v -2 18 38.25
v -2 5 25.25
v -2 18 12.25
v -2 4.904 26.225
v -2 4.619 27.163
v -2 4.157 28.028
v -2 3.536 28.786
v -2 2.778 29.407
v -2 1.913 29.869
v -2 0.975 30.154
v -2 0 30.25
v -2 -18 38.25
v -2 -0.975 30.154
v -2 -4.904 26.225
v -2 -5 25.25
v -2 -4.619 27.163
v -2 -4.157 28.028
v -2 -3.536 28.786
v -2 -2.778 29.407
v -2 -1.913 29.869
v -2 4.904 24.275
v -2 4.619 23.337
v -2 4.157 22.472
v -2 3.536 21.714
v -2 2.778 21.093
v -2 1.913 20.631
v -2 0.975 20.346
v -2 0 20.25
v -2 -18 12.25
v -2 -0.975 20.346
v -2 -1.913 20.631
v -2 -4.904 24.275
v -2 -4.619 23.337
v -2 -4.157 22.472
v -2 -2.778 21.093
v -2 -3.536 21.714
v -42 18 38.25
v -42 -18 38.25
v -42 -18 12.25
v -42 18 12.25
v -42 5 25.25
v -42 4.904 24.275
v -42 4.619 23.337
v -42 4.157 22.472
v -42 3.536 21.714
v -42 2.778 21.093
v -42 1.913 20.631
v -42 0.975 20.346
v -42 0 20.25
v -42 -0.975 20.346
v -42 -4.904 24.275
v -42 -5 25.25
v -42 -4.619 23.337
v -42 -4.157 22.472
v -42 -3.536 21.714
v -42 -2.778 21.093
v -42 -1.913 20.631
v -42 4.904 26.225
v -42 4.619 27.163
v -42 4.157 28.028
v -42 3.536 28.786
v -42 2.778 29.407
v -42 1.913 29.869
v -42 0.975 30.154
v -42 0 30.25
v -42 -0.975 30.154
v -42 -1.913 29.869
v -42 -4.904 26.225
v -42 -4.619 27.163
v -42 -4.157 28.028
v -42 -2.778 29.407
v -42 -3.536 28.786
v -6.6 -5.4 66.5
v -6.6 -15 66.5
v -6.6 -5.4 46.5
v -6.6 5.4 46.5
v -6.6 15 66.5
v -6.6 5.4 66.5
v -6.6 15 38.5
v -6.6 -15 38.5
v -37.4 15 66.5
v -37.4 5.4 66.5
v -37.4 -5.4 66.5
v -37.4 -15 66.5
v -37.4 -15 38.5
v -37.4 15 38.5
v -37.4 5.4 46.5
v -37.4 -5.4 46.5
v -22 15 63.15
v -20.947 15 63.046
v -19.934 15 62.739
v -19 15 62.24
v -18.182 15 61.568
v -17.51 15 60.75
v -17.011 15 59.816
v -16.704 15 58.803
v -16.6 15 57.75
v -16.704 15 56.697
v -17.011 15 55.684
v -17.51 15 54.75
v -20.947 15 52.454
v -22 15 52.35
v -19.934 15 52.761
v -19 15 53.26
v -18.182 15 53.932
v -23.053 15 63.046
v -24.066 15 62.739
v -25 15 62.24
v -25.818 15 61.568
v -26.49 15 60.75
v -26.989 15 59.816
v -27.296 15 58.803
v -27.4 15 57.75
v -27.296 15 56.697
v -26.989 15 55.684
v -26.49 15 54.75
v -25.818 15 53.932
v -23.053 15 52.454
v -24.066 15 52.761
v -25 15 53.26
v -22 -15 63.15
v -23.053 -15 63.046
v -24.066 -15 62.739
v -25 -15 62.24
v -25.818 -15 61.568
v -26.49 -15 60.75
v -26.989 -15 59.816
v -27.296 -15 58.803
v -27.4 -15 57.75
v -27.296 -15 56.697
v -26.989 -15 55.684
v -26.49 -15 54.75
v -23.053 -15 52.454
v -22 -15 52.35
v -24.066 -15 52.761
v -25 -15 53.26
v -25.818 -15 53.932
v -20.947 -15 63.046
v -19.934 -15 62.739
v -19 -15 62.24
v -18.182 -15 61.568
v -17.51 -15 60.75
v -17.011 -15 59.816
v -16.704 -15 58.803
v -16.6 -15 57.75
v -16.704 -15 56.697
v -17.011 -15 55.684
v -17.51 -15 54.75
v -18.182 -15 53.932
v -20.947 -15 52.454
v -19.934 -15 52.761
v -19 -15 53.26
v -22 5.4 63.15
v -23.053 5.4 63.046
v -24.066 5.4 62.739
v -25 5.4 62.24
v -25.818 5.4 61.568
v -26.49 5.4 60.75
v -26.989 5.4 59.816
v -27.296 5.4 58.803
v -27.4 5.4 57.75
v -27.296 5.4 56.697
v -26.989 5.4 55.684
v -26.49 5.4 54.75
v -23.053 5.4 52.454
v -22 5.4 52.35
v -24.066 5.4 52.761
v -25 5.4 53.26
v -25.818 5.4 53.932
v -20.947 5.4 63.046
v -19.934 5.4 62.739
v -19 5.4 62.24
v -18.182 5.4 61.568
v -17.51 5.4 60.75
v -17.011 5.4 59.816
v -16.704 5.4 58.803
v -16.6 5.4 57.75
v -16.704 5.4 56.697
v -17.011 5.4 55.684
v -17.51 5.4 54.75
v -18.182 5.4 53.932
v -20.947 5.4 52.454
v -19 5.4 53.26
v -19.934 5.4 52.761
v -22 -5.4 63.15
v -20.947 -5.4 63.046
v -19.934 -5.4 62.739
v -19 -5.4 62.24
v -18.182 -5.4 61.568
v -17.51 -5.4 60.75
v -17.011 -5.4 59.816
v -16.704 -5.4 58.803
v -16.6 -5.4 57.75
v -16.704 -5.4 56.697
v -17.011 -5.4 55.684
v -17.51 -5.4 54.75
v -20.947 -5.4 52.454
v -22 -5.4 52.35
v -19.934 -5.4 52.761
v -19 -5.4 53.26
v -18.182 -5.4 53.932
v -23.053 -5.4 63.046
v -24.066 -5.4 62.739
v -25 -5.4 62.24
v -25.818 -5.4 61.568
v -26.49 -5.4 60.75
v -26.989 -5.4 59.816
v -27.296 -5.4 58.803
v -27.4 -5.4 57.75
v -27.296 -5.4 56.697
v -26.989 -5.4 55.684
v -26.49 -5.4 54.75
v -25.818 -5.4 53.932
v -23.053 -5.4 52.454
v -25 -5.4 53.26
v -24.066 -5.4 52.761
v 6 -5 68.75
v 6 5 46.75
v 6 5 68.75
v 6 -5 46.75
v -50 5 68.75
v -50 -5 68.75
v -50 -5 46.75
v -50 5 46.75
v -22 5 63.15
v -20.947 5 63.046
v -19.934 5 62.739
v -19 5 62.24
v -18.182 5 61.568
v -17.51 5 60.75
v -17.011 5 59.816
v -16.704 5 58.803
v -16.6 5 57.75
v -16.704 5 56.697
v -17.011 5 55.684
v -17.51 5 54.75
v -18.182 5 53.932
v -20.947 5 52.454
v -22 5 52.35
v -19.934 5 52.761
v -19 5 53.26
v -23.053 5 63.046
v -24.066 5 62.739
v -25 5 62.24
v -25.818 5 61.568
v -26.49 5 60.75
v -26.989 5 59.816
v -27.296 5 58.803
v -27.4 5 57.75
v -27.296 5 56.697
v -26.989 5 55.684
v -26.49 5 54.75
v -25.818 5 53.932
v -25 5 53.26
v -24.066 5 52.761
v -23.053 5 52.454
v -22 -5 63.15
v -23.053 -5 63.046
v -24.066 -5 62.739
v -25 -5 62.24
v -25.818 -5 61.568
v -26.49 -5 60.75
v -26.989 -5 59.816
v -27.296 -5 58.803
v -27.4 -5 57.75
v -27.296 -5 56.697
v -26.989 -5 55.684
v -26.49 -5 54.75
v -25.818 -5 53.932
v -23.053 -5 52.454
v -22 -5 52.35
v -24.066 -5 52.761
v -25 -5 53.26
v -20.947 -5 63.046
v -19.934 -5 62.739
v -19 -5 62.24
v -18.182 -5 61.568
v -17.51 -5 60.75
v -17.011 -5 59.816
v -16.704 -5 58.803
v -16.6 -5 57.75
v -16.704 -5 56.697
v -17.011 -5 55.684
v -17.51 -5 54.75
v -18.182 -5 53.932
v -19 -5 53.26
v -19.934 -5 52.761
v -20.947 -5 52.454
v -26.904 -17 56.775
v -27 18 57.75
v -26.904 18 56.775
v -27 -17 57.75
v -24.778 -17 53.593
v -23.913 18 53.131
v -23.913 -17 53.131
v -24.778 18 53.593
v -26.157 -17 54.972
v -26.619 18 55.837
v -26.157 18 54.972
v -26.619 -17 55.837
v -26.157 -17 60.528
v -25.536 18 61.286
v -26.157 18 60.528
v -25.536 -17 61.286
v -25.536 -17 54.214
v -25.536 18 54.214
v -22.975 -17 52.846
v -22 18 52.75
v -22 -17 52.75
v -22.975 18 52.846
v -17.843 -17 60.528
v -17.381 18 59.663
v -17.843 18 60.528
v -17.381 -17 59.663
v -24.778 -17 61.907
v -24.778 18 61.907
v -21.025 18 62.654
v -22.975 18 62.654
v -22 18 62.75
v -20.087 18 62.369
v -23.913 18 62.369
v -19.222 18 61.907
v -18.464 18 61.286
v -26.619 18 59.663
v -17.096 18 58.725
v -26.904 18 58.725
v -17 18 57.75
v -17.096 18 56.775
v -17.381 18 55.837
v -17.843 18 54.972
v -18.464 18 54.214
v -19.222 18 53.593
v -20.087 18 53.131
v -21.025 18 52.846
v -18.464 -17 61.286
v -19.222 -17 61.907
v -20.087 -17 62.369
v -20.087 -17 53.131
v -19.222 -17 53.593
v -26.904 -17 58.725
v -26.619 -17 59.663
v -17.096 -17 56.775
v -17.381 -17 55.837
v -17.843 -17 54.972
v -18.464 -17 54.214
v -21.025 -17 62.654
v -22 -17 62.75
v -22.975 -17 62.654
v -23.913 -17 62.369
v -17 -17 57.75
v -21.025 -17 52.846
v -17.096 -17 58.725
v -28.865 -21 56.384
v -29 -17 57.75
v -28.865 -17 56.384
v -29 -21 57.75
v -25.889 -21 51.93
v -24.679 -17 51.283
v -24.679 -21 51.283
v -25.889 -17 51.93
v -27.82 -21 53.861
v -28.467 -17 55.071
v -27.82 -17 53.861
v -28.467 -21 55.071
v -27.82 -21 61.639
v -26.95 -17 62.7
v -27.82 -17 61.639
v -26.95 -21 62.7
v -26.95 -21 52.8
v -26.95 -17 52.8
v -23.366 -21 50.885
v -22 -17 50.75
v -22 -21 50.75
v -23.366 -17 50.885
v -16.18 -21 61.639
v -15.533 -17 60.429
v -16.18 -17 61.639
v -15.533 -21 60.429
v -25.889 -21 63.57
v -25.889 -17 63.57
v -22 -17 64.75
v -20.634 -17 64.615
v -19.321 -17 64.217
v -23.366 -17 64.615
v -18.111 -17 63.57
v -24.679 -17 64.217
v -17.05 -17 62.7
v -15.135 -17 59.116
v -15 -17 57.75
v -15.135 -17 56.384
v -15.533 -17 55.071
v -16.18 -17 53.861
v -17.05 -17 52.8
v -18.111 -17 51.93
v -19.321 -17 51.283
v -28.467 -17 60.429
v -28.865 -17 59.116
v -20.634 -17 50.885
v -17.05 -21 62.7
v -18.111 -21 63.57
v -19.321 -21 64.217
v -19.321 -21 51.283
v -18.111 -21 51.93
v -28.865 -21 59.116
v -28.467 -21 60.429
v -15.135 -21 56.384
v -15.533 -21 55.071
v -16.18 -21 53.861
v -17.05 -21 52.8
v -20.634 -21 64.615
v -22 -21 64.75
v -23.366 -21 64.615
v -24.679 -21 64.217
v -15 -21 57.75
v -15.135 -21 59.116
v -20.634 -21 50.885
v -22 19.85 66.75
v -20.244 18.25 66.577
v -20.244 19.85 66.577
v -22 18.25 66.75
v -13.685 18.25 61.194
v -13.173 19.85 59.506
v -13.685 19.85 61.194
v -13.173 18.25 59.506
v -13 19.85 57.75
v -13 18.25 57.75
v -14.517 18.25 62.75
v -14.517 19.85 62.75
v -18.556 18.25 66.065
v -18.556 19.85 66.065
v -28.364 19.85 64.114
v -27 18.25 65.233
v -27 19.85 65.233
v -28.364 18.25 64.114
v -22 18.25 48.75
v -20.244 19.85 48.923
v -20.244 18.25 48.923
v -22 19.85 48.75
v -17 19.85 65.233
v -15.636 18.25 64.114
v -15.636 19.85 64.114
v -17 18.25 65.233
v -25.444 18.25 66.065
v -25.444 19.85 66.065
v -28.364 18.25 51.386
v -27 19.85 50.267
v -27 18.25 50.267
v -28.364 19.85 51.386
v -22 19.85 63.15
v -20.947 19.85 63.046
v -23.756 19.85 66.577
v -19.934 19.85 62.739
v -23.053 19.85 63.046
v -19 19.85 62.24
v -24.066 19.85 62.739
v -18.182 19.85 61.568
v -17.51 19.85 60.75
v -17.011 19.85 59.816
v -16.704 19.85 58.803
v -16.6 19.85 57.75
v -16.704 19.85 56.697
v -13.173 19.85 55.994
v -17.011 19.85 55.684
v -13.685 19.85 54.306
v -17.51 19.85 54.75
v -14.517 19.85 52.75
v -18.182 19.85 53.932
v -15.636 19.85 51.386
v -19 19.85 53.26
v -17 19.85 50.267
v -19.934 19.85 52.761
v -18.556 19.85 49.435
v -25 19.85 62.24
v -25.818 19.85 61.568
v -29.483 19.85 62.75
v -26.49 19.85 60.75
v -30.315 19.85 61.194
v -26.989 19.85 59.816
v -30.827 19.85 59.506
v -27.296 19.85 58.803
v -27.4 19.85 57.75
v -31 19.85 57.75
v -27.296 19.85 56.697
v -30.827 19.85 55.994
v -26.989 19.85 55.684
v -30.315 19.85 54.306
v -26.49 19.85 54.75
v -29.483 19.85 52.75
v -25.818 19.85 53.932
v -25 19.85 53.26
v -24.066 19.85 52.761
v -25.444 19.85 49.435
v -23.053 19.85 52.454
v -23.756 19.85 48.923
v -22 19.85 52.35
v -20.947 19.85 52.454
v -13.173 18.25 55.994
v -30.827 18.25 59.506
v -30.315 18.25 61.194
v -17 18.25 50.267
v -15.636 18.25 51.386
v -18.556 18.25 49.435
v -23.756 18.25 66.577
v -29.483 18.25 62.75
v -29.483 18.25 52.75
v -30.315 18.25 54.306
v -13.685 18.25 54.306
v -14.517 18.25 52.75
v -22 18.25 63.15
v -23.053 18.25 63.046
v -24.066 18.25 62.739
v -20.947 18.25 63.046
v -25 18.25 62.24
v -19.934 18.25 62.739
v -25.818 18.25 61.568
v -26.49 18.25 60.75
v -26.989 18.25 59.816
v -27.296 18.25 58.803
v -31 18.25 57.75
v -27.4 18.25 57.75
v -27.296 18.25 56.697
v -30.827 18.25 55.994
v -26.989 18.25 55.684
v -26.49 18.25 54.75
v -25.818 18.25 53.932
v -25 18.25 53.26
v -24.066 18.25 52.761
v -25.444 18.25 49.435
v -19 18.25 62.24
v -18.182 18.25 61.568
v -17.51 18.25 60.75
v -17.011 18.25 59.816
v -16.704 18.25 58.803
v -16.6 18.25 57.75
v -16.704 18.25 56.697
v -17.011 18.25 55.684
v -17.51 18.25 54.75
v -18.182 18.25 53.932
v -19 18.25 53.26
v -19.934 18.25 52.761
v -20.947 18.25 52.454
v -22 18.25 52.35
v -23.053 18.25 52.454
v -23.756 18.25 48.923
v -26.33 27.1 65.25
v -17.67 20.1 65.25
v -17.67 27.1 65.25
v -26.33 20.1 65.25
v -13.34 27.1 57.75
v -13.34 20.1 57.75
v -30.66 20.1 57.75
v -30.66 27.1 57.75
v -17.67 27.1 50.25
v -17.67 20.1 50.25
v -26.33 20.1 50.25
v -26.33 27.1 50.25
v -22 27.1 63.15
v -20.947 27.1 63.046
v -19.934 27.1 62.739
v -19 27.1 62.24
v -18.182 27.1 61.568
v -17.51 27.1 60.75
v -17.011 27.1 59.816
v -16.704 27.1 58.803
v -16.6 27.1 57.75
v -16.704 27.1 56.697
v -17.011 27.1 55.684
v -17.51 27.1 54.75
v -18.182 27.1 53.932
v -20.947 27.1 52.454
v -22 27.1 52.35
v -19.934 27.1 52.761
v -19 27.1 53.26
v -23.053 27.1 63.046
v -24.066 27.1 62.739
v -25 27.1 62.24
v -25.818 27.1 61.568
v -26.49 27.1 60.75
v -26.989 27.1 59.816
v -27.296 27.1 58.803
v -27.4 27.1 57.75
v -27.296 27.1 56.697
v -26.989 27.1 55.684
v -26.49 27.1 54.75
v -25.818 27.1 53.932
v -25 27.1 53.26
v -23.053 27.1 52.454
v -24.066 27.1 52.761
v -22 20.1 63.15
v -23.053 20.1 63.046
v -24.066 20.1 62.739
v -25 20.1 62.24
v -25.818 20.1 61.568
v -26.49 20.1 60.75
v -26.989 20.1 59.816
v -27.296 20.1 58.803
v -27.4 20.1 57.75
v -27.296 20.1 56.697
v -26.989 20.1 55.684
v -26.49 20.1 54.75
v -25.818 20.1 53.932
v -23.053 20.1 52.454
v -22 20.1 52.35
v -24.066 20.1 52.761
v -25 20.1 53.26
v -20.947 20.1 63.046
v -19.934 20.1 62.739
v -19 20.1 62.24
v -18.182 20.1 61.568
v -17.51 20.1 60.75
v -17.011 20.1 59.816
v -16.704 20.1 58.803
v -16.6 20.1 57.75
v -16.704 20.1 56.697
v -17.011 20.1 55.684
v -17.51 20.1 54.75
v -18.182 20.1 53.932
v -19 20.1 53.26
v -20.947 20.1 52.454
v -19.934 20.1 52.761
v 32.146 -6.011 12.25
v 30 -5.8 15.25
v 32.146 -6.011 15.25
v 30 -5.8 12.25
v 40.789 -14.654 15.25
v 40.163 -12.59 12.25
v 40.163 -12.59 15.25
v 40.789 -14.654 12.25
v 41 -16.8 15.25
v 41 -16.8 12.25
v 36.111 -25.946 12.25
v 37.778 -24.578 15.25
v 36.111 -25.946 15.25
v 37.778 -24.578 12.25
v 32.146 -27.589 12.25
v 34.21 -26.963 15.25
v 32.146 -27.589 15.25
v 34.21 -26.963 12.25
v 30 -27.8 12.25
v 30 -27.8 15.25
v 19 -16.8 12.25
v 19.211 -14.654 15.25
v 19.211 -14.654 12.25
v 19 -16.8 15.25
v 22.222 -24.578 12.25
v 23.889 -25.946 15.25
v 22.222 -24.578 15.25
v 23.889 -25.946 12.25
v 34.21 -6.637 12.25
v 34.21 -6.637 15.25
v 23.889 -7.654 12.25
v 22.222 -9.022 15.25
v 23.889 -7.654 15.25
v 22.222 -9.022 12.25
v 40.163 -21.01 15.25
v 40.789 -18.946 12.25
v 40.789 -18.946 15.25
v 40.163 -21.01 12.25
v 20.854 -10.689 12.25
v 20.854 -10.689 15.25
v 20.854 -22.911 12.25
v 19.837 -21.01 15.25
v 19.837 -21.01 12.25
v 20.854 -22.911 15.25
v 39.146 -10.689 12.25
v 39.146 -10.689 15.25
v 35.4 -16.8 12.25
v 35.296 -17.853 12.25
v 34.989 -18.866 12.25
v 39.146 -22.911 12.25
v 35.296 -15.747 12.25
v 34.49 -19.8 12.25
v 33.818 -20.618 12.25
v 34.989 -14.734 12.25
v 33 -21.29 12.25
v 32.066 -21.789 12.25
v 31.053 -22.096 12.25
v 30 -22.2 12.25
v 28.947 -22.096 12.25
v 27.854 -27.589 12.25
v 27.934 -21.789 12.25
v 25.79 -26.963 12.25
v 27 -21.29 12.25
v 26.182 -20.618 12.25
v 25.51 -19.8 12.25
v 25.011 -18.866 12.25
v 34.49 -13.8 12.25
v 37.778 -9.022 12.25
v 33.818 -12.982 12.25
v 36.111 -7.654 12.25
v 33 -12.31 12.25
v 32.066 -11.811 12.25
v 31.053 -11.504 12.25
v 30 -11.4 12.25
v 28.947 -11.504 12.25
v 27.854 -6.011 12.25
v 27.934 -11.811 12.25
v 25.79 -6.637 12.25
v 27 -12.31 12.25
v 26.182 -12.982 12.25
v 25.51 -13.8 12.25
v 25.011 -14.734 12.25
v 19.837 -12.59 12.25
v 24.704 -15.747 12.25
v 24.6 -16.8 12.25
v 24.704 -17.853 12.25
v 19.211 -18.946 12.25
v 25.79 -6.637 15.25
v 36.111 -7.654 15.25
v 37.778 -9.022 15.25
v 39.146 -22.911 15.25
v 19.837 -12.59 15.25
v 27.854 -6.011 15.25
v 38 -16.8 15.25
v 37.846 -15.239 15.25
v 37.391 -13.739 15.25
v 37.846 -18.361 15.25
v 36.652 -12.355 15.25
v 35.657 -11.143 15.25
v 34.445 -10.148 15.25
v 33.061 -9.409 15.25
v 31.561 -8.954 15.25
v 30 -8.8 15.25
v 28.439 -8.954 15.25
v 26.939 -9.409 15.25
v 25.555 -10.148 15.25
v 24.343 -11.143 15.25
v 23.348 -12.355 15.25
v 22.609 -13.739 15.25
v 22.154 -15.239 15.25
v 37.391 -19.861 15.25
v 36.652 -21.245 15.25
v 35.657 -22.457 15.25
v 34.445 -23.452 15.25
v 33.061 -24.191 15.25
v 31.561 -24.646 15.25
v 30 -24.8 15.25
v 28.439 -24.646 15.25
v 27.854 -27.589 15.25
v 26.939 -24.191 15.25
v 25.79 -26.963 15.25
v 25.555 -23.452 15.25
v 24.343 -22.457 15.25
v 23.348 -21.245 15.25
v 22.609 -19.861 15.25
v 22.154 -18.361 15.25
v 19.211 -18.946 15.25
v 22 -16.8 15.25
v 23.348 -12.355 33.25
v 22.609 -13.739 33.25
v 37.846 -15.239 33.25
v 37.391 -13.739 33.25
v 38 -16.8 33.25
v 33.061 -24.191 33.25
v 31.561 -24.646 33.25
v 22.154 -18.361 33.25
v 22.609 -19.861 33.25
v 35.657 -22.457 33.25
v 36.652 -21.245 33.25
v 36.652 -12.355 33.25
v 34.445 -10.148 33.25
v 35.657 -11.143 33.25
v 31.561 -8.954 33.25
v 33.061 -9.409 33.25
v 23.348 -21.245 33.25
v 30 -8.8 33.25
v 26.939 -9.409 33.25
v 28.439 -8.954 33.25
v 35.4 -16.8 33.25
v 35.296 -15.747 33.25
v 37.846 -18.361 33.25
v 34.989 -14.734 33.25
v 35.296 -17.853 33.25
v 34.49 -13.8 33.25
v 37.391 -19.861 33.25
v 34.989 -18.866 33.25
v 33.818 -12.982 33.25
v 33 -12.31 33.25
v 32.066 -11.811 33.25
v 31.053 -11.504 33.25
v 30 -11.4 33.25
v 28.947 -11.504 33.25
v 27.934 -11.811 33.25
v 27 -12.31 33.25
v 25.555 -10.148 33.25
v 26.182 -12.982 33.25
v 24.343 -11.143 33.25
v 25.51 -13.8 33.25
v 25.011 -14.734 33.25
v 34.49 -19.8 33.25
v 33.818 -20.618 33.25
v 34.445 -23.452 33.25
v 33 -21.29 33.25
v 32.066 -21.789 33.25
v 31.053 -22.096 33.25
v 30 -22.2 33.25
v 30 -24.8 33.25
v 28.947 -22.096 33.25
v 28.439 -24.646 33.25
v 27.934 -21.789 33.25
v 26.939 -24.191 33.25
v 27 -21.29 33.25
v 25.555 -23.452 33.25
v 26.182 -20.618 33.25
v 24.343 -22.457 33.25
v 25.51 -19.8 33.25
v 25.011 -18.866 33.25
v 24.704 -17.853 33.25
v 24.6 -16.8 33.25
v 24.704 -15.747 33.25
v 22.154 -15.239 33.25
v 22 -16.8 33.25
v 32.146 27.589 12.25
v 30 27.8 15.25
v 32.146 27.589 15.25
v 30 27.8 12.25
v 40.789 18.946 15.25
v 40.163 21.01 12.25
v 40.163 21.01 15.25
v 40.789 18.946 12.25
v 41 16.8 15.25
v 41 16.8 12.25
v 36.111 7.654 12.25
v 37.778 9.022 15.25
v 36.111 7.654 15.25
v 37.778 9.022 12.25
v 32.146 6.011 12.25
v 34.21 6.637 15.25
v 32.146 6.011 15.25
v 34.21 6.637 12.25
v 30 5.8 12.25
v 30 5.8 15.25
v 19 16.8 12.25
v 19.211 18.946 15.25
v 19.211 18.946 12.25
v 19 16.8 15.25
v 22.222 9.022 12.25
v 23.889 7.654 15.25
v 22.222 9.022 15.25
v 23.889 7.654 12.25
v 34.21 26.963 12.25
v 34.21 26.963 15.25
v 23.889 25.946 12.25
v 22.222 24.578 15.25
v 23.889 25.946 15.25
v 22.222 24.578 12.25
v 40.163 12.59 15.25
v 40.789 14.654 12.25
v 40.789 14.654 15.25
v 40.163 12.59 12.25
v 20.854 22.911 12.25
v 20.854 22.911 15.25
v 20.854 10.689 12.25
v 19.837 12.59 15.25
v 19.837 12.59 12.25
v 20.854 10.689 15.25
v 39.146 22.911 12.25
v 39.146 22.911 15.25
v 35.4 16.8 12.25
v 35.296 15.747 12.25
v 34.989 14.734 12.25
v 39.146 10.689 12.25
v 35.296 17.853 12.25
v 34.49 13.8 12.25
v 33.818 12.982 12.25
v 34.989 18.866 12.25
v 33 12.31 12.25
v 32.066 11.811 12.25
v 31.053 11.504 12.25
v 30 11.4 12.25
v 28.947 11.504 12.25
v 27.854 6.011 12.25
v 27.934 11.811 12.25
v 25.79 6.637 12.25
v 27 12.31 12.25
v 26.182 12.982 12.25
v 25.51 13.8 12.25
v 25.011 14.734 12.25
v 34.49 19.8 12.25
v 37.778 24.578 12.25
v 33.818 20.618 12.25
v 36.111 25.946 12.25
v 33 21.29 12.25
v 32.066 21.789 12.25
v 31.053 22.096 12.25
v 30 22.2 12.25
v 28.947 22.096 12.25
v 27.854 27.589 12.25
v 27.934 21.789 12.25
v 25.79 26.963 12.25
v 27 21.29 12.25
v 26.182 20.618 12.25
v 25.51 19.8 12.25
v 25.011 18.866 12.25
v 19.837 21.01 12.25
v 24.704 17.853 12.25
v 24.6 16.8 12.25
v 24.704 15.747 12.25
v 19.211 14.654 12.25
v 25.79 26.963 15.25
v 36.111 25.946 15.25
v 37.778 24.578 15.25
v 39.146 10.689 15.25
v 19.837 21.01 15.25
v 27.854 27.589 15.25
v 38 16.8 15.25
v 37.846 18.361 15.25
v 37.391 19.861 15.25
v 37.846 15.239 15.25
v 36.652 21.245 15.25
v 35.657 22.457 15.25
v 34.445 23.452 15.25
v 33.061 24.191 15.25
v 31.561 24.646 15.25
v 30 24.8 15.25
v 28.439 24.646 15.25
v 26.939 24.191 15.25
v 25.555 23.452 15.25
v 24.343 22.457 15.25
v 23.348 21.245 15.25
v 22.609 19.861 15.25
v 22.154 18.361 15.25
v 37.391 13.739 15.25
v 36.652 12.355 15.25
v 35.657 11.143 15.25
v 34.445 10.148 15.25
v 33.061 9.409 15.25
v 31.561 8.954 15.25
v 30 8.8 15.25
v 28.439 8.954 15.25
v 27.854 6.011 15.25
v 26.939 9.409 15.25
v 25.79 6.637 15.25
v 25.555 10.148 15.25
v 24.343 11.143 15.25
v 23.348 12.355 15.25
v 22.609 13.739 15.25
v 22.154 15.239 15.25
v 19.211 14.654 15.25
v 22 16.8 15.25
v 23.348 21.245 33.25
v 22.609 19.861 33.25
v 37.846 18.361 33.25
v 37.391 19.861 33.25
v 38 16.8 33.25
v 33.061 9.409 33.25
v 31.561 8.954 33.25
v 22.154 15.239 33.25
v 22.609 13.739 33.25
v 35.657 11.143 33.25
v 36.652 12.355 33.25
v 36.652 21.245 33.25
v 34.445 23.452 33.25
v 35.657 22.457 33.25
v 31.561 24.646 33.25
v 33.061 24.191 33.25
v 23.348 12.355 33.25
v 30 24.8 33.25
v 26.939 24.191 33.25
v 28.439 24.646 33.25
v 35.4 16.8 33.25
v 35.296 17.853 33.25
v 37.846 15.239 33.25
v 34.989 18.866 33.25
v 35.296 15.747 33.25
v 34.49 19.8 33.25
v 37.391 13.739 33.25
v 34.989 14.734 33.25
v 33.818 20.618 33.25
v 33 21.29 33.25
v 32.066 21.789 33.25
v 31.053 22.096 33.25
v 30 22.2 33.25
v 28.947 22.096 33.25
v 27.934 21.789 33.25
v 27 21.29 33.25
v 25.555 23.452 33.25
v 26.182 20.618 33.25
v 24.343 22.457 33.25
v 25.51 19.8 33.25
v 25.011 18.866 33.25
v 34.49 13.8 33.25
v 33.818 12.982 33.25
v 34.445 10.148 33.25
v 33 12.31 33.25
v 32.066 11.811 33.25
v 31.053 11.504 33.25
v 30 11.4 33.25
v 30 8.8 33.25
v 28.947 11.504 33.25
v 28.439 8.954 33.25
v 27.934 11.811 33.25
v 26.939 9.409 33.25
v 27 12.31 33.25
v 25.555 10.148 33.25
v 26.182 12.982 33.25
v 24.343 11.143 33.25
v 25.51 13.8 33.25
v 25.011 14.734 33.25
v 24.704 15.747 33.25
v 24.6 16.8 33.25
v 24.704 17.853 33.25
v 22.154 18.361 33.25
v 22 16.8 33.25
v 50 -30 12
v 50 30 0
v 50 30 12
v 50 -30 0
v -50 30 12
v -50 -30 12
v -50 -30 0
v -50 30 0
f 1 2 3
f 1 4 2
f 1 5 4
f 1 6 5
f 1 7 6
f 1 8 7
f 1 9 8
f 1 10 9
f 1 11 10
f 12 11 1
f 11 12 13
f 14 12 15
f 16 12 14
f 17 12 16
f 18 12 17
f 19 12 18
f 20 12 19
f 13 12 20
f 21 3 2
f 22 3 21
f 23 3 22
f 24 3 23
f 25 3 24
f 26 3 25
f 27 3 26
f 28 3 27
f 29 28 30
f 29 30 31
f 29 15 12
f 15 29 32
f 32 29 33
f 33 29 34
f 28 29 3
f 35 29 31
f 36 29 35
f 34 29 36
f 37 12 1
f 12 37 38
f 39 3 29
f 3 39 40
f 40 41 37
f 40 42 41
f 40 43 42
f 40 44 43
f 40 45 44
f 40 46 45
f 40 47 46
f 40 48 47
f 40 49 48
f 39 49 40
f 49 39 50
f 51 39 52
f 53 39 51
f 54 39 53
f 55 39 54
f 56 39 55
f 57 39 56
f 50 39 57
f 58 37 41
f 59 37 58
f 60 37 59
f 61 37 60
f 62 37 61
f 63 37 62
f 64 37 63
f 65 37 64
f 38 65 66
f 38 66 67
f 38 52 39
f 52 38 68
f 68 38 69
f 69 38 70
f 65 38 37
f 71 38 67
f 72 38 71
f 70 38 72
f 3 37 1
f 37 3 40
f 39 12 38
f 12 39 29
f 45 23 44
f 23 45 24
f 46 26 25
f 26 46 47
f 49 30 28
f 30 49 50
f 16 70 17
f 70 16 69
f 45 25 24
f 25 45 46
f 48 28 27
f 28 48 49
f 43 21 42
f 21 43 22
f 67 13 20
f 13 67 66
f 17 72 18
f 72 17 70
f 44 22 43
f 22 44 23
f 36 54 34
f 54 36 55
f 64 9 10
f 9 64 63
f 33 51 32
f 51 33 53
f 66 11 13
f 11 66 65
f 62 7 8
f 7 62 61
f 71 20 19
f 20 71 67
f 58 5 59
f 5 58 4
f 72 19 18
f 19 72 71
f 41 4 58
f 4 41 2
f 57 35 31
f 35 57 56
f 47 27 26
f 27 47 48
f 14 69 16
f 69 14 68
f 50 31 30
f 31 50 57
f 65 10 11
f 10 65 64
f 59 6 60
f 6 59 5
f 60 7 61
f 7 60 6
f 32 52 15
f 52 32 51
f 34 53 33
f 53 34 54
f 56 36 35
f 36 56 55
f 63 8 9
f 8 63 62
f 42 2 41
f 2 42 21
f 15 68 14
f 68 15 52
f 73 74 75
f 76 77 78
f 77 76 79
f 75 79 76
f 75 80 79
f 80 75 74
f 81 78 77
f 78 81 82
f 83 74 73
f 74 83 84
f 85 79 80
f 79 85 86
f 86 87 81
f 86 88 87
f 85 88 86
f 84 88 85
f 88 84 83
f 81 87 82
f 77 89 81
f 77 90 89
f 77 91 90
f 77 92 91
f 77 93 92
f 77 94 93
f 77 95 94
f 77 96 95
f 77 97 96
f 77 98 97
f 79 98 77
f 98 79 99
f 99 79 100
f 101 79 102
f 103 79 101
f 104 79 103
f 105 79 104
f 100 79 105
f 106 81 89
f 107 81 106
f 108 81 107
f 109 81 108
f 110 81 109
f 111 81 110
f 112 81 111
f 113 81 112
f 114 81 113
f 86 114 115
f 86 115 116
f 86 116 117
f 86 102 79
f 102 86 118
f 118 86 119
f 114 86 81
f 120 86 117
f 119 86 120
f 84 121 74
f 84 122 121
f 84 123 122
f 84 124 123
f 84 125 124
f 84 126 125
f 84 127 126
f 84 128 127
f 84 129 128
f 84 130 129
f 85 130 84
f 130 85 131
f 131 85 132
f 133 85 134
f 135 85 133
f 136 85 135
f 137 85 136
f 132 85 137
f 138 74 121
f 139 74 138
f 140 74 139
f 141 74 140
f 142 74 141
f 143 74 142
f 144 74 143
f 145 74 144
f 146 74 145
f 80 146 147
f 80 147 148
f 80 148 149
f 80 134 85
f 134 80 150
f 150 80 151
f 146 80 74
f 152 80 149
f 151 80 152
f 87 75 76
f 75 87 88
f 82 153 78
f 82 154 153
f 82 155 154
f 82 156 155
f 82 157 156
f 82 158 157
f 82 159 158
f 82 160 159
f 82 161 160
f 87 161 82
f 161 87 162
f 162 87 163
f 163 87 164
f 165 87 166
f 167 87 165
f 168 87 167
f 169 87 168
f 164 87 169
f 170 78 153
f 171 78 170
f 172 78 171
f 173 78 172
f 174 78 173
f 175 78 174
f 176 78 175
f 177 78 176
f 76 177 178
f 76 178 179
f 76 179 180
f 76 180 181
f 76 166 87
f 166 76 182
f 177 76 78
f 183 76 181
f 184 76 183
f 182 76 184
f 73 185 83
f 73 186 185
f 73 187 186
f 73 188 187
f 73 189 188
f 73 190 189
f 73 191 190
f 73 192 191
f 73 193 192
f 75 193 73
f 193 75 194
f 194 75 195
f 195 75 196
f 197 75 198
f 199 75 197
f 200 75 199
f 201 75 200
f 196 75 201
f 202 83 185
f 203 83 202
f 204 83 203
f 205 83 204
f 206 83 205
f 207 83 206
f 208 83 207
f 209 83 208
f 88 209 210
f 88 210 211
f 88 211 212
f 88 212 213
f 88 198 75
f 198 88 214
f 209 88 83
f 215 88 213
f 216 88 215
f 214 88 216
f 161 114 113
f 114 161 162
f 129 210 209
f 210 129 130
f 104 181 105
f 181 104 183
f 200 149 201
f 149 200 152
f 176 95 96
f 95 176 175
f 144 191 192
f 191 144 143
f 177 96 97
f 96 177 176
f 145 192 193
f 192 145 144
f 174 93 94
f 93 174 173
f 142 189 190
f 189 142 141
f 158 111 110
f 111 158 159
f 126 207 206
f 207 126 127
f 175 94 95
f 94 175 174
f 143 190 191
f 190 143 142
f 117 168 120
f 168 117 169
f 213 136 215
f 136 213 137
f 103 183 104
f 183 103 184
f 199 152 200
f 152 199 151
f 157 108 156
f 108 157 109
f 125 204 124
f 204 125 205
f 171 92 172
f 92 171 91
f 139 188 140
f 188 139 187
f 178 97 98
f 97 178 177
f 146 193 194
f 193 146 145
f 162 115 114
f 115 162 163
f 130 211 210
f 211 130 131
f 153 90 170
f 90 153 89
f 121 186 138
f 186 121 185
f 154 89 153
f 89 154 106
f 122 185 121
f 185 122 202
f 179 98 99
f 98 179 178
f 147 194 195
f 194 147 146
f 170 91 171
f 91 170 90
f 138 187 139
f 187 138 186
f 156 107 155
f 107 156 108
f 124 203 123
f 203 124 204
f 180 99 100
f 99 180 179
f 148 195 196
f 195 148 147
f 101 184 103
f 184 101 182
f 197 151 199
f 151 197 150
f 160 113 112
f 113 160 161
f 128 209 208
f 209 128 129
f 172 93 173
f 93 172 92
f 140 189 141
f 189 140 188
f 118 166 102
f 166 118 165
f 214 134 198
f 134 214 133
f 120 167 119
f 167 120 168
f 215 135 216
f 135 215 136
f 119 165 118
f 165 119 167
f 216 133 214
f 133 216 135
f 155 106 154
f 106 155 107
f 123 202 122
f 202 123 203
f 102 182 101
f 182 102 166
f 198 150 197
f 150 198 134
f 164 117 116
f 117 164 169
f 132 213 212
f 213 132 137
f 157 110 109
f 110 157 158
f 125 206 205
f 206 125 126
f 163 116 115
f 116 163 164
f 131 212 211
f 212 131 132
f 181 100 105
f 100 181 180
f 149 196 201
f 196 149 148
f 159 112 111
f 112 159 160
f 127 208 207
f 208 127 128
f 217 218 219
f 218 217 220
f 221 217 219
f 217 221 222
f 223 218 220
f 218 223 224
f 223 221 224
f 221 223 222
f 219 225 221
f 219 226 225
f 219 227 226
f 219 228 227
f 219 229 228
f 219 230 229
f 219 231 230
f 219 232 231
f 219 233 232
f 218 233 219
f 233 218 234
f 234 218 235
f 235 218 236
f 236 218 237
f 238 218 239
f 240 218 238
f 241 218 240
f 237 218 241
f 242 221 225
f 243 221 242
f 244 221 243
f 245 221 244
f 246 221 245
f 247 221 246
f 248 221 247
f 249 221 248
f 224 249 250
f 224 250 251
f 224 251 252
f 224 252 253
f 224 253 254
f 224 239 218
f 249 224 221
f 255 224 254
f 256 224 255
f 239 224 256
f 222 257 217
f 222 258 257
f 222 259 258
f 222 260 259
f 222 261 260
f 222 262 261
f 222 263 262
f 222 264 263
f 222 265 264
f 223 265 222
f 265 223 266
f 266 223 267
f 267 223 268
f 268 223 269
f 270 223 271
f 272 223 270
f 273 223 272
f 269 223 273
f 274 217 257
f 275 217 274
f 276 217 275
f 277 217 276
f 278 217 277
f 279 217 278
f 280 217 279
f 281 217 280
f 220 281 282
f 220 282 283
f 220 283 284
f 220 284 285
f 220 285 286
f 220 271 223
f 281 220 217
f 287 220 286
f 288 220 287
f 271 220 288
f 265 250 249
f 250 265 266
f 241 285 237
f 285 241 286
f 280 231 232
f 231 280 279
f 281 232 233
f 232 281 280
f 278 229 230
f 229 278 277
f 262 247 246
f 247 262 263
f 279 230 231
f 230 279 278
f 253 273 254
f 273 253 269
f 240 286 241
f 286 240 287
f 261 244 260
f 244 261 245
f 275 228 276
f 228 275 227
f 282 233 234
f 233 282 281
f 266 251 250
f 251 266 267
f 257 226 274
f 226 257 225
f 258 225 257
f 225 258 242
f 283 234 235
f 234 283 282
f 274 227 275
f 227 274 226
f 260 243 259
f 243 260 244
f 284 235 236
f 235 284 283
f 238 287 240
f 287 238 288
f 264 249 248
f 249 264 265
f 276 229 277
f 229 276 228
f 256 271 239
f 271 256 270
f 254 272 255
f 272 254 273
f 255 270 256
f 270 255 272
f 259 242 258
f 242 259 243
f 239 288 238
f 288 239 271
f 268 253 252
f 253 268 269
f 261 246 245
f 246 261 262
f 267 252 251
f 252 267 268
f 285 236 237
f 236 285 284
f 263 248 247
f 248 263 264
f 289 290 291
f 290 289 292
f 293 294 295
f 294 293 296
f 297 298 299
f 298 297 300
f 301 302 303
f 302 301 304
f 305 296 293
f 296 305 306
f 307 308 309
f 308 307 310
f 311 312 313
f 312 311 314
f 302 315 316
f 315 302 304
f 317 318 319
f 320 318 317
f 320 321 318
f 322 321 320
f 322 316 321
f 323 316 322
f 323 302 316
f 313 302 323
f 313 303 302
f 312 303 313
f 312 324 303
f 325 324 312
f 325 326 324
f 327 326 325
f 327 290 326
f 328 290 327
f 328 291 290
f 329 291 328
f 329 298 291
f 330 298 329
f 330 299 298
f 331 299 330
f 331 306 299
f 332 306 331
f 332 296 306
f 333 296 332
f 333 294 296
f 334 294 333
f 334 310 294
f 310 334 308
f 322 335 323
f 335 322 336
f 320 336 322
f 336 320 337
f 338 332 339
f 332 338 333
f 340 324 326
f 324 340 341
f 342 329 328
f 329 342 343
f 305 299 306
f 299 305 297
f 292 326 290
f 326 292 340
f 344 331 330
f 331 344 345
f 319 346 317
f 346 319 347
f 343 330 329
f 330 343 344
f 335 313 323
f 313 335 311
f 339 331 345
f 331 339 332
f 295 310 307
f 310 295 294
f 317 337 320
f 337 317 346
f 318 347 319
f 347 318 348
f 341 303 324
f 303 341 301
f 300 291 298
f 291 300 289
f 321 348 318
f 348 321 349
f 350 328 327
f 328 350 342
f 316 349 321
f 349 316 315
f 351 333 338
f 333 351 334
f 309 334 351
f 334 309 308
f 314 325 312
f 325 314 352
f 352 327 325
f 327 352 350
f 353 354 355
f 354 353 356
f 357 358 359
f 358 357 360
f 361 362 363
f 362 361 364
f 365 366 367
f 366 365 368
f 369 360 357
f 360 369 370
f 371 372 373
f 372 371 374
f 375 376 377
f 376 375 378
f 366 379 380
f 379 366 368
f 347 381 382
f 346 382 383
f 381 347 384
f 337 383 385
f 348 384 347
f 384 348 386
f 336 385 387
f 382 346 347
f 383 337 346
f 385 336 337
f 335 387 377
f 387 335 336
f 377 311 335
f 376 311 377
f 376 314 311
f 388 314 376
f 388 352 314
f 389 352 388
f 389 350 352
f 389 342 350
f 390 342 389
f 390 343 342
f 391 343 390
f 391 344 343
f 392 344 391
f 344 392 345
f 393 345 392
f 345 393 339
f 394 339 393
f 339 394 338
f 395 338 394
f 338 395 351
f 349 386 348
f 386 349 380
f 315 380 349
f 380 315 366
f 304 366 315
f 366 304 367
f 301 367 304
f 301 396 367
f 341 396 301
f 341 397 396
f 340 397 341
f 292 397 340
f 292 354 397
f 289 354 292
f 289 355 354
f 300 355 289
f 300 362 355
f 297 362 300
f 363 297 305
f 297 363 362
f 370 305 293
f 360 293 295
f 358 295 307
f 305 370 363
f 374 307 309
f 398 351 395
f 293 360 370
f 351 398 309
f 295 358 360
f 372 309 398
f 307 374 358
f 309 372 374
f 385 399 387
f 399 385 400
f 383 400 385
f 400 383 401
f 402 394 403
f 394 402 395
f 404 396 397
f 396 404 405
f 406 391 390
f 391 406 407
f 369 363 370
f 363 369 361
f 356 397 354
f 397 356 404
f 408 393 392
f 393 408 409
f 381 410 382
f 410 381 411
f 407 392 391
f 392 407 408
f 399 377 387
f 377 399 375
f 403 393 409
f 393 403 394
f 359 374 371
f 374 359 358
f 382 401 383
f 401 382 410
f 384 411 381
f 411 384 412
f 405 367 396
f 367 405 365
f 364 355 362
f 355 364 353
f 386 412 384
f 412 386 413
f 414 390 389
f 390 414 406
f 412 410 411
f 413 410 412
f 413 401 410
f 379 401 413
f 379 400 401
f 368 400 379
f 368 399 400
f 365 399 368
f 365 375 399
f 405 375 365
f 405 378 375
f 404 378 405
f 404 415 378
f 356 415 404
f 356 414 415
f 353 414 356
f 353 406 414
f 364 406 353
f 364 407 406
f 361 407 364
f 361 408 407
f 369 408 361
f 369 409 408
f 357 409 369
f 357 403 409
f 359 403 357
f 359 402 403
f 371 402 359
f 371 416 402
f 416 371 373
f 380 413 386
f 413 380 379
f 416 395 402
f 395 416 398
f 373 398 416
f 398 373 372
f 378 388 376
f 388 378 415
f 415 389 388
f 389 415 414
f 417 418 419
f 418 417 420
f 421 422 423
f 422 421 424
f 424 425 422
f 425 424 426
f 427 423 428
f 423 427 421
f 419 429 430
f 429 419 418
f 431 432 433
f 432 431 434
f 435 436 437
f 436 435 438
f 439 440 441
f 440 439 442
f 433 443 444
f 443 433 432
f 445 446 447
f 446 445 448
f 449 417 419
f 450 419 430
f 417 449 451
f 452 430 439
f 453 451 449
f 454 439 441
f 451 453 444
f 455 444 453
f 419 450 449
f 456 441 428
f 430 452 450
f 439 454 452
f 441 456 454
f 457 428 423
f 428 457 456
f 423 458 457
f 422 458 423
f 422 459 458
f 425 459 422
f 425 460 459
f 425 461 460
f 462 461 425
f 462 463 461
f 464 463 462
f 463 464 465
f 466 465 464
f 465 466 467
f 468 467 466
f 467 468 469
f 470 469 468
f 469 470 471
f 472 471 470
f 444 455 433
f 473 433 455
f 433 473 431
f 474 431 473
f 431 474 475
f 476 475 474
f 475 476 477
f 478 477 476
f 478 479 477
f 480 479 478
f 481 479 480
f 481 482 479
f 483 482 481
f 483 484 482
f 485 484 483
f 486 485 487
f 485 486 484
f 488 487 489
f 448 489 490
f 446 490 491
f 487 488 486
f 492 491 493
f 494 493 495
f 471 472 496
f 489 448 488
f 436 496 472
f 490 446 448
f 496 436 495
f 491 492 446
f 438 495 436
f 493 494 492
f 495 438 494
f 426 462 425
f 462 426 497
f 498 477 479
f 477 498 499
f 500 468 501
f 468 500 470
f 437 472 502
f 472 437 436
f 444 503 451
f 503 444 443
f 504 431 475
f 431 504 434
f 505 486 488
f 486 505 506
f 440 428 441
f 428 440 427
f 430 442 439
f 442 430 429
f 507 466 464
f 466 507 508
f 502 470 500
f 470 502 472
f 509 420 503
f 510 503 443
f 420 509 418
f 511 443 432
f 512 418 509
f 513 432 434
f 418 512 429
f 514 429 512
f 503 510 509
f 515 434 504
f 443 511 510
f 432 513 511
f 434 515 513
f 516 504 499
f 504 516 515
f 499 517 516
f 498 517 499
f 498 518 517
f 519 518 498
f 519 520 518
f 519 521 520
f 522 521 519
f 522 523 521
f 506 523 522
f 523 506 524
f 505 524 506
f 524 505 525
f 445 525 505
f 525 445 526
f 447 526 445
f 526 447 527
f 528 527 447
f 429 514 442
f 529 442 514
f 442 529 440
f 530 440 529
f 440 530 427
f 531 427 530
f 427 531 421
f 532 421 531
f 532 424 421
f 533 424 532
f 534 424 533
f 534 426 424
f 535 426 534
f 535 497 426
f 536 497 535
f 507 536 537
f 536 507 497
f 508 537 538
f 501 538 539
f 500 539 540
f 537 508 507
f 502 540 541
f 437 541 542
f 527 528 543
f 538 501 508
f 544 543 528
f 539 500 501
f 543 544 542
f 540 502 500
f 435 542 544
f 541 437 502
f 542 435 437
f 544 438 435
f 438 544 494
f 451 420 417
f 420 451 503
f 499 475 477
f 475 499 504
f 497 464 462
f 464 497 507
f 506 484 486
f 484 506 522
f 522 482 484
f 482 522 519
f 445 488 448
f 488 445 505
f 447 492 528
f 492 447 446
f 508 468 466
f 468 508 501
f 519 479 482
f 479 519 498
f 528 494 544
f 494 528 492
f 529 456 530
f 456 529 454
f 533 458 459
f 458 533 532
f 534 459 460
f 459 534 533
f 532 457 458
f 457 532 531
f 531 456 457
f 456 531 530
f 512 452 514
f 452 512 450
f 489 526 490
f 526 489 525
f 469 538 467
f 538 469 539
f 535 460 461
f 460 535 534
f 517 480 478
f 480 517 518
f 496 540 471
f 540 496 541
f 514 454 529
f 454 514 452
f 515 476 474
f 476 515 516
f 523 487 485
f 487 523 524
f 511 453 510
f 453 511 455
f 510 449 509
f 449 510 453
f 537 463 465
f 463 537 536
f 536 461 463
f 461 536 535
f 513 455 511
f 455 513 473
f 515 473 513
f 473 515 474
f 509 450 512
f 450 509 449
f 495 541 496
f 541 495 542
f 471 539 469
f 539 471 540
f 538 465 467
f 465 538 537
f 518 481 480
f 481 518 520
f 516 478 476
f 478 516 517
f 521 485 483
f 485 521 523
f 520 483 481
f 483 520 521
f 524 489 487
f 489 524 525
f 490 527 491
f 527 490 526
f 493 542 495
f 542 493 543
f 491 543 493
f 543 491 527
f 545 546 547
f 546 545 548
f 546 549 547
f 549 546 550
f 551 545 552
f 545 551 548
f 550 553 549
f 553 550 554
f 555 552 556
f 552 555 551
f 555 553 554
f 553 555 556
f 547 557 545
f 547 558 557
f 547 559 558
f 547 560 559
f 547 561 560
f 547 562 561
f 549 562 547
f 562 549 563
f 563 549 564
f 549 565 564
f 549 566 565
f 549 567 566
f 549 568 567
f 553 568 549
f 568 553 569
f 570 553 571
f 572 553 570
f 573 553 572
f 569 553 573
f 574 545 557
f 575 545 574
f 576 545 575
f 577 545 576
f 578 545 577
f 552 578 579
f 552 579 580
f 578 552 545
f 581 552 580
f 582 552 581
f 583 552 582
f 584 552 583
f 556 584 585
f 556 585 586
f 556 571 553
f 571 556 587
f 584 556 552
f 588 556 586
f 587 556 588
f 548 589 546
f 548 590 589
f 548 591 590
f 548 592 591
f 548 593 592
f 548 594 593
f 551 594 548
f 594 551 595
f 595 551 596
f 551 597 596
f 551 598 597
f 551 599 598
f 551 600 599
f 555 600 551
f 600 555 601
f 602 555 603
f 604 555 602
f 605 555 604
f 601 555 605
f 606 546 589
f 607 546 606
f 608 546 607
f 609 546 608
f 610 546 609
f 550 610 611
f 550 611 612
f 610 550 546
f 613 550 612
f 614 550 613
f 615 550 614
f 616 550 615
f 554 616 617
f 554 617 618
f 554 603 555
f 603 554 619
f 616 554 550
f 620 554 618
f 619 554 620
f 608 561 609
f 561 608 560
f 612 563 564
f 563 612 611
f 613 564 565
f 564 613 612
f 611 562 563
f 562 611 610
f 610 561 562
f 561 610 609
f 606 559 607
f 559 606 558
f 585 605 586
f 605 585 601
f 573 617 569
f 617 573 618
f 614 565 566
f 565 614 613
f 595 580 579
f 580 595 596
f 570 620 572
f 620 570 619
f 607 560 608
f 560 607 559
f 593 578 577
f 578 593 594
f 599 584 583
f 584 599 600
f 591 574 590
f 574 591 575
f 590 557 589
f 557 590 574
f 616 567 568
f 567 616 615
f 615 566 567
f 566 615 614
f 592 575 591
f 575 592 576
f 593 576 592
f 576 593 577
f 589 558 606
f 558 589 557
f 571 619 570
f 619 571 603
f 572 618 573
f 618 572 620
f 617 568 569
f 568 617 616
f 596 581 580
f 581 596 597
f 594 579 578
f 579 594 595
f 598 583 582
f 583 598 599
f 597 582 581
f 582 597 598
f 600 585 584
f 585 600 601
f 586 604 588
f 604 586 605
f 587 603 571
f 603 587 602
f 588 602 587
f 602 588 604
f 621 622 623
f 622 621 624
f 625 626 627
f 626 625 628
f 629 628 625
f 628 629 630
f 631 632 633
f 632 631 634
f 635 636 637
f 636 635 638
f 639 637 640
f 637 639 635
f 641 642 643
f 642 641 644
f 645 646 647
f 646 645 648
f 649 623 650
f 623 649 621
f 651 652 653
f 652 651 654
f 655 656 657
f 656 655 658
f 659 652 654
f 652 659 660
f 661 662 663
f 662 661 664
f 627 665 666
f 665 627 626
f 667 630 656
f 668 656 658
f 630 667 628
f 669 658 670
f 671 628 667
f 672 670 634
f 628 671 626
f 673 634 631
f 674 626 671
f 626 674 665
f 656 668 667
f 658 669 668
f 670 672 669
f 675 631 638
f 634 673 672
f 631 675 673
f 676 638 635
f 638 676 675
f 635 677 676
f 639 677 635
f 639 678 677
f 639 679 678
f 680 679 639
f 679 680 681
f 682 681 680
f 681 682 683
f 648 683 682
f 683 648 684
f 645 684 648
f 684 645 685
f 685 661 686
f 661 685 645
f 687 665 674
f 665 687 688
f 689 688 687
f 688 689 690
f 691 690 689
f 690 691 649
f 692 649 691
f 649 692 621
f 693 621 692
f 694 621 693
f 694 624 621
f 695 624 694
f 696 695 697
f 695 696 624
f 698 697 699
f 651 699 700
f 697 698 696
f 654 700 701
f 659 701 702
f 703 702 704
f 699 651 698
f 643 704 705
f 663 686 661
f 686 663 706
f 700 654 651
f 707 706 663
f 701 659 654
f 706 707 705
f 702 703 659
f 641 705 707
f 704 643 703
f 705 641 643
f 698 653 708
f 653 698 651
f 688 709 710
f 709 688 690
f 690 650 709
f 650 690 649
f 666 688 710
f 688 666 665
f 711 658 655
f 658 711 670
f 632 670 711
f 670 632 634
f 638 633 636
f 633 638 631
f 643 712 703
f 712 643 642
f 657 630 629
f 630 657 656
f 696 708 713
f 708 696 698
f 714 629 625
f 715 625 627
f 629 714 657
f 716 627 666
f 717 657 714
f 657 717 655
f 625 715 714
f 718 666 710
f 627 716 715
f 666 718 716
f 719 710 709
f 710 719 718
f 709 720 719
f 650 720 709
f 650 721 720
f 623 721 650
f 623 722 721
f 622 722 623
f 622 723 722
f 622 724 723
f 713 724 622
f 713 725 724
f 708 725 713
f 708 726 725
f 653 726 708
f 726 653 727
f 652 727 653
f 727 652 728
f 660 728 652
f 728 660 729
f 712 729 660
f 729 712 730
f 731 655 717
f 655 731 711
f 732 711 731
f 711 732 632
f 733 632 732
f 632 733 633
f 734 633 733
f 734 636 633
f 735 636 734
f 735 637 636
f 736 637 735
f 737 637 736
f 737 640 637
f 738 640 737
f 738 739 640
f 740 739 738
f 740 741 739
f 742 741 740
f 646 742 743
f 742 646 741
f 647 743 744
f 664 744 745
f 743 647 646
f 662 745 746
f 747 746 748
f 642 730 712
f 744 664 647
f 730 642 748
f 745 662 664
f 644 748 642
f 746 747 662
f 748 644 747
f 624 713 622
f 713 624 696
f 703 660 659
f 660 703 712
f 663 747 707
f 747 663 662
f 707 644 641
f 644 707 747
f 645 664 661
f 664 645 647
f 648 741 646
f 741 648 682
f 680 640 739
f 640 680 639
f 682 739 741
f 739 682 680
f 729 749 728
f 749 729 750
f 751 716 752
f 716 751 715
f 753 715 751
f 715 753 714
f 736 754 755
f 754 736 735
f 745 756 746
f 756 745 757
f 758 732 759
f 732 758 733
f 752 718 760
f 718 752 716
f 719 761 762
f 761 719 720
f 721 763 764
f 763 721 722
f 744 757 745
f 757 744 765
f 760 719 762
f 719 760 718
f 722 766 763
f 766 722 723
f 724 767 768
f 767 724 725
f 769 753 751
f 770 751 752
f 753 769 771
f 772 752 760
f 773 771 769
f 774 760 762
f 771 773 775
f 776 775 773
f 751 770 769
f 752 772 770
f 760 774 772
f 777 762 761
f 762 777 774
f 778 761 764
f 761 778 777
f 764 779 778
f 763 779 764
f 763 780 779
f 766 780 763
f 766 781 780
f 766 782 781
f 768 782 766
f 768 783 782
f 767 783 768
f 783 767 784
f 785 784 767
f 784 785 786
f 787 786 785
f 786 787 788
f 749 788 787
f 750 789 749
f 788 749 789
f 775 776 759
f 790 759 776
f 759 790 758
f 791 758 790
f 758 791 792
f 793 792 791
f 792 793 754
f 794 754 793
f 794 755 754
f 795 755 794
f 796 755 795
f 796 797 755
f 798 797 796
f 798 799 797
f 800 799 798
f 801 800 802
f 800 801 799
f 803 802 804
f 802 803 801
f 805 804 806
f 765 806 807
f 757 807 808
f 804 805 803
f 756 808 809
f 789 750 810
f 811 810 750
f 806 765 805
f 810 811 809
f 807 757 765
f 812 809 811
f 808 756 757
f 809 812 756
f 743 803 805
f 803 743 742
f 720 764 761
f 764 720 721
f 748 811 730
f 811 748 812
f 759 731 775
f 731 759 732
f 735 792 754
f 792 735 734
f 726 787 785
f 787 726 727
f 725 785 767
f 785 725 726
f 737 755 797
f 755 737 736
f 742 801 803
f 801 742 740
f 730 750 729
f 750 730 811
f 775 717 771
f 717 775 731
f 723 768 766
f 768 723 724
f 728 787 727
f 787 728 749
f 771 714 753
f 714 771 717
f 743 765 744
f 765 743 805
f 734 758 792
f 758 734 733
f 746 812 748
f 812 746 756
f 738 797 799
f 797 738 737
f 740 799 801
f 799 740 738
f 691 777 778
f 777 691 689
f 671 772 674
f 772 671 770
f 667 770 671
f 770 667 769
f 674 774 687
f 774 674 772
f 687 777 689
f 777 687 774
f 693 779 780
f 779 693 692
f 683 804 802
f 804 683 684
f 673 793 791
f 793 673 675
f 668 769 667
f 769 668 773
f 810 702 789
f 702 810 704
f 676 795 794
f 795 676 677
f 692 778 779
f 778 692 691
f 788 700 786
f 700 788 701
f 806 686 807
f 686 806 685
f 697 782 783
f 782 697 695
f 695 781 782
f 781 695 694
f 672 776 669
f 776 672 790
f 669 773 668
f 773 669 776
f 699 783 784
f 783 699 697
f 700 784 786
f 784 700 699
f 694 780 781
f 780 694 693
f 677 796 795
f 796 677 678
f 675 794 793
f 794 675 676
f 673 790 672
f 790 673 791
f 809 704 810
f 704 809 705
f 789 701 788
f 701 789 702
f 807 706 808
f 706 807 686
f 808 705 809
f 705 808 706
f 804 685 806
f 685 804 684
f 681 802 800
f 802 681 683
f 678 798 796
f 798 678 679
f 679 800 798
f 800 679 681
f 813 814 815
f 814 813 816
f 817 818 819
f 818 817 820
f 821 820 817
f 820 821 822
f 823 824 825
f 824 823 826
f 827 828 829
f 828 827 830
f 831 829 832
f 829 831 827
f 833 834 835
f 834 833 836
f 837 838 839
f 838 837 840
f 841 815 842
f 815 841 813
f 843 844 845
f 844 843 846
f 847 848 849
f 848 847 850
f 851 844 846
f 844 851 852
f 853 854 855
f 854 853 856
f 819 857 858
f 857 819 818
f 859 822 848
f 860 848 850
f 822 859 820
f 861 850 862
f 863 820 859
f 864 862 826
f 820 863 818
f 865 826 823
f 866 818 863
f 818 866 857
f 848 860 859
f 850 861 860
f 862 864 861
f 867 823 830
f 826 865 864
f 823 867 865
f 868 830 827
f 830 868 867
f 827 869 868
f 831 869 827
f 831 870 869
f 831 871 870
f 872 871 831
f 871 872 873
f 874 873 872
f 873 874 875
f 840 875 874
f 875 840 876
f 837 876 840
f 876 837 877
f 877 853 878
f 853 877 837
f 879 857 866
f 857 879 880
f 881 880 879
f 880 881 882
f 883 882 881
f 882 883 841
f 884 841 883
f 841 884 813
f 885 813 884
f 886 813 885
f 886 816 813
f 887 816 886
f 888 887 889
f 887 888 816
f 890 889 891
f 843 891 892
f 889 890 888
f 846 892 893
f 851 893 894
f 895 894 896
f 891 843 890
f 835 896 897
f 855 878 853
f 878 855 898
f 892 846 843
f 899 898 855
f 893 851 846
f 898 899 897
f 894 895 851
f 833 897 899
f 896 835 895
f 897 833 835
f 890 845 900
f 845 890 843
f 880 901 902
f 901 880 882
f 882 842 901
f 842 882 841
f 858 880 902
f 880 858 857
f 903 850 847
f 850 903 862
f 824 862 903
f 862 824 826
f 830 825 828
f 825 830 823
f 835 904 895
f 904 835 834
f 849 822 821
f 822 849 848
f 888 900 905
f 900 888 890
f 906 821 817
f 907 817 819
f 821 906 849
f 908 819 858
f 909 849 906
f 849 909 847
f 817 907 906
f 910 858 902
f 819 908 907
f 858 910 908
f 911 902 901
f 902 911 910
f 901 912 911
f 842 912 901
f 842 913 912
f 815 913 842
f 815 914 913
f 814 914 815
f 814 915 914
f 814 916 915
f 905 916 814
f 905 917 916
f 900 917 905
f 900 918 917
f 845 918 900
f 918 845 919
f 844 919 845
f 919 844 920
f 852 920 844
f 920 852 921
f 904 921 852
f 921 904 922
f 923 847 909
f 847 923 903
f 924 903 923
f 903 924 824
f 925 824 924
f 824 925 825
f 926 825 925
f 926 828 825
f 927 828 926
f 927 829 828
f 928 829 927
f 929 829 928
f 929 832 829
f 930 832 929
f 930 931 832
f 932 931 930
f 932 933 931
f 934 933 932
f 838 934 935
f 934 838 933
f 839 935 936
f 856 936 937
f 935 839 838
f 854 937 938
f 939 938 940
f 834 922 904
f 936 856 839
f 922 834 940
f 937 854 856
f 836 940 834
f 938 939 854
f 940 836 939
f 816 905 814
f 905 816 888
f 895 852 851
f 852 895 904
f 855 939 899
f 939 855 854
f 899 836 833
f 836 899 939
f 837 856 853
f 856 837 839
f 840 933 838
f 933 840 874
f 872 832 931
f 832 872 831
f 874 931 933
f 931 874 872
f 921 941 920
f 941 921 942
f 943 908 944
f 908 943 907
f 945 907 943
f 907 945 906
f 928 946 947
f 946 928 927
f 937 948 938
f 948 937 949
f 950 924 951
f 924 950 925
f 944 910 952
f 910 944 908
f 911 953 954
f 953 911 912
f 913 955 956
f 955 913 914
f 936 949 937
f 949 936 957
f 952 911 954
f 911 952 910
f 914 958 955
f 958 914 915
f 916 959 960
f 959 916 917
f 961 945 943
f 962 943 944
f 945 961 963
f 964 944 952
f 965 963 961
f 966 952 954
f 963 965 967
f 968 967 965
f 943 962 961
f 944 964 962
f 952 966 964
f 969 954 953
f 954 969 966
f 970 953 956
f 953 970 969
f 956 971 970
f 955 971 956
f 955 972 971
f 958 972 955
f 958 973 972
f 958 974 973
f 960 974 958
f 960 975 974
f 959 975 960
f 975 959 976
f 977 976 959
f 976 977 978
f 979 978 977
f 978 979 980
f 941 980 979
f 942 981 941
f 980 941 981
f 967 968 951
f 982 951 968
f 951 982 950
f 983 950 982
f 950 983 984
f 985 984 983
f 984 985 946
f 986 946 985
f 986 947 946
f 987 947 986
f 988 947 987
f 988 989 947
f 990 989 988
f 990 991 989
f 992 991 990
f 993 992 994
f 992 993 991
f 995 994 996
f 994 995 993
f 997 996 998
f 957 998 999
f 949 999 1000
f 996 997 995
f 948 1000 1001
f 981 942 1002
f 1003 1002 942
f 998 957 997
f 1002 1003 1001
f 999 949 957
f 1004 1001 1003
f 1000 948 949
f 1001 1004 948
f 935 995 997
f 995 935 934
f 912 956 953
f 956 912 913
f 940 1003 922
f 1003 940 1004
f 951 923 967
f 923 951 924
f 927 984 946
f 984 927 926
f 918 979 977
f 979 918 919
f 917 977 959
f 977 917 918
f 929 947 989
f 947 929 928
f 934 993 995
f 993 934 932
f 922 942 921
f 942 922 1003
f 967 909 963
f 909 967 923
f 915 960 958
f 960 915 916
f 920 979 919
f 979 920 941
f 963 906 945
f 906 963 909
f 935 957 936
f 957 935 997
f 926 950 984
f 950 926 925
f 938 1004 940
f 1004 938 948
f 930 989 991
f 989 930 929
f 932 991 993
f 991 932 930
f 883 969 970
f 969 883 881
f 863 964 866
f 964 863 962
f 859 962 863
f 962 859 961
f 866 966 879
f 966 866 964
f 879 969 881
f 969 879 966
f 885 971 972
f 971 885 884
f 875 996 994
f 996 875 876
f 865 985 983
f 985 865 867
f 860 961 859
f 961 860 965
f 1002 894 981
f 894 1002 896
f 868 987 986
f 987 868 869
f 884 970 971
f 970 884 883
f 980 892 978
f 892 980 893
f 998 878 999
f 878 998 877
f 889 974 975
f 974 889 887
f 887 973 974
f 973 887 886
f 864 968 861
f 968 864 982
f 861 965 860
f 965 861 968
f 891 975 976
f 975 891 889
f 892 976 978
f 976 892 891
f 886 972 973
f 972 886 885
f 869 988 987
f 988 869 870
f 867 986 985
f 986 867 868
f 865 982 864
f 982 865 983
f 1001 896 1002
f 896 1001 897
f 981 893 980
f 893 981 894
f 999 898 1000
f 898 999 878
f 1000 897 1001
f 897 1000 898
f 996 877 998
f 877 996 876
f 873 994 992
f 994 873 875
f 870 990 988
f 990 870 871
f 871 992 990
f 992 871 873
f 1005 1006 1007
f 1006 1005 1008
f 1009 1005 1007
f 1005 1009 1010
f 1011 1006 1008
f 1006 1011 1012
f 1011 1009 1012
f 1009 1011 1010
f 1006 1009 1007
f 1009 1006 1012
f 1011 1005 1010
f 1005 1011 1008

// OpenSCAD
$fn = 32;

// ------------------------------------------------------------------------
// Indexing jig: plate 100 x 60 mm, pin d10
// Every part is its own module, assembly() places every instance.
// ------------------------------------------------------------------------

// --- part 1 ---
module jig_plate() {
  difference() {
    translate([-50, -30, 0]) cube([100, 60, 12]);
  }
}

// --- part 2 ---
module locator_block() {
  difference() {
    translate([-20, -18, 0]) cube([40, 36, 26]);
    translate([0, 0, 13]) rotate([0, 90, 0]) cylinder(h = 42, d = 10, center = true);
  }
}

// --- part 3 ---
module index_fork() {
  difference() {
    translate([-15.4, -15, 0]) cube([30.8, 30, 28]);
    translate([-16.4, -5.4, 8]) cube([32.8, 10.8, 21]);
    translate([0, 0, 19.25]) rotate([90, 0, 0]) cylinder(h = 32, d = 10.8, center = true);
  }
}

// --- part 4 ---
module index_arm() {
  difference() {
    translate([-28, -5, 0]) cube([56, 10, 22]);
    translate([0, 0, 11]) rotate([90, 0, 0]) cylinder(h = 12, d = 10.8, center = true);
  }
}

// --- part 5 ---
module index_pin() {
  rotate([0, 90, 0]) cylinder(h = 36, d = 10, center = true);
  translate([-21, 0, 0]) rotate([0, 90, 0]) cylinder(h = 4, d = 14);
}

// --- part 6 ---
module pin_washer() {
  difference() {
      translate([0, 0, 0]) cylinder(h = 1.6, d = 18);
      translate([0, 0, -1]) cylinder(h = 3.6, d = 10.8);
    }
}

// --- part 7 ---
module lock_nut() {
  difference() {
    linear_extrude(height = 7) polygon(points = [[8.66, 0], [4.33, 7.5], [-4.33, 7.5], [-8.66, 0], [-4.33, -7.5], [4.33, -7.5]]);
    translate([0, 0, -1]) cylinder(h = 9, d = 10.8);
  }
}

// --- part 8 ---
module guide_bush_a() {
  difference() {
    union() {
      cylinder(h = 3, d = 22);
      translate([0, 0, 3]) cylinder(h = 18, d = 16);
    }
    translate([0, 0, -1]) cylinder(h = 23, d = 10.8);
  }
}

// --- part 9 ---
module guide_bush_b() {
  difference() {
    union() {
      cylinder(h = 3, d = 22);
      translate([0, 0, 3]) cylinder(h = 18, d = 16);
    }
    translate([0, 0, -1]) cylinder(h = 23, d = 10.8);
  }
}

// --- assembly ---
module assembly() {
  color([0.80, 0.24, 0.20]) translate([0, 0, 0]) rotate([0, 0, 0]) jig_plate();
  color([0.20, 0.45, 0.75]) translate([-22, 0, 12.25]) rotate([0, 0, 0]) locator_block();
  color([0.25, 0.62, 0.32]) translate([-22, 0, 38.5]) rotate([0, 0, 0]) index_fork();
  color([0.92, 0.70, 0.18]) translate([-22, 0, 46.75]) rotate([0, 0, 0]) index_arm();
  color([0.58, 0.35, 0.70]) translate([-22, 0, 57.75]) rotate([0, 0, 90]) index_pin();
  color([0.16, 0.66, 0.66]) translate([-22, 19.85, 57.75]) rotate([90, 0, 0]) pin_washer();
  color([0.85, 0.48, 0.18]) translate([-22, 27.1, 57.75]) rotate([90, 0, 0]) lock_nut();
  color([0.55, 0.60, 0.65]) translate([30, -16.8, 12.25]) rotate([0, 0, 0]) guide_bush_a();
  color([0.75, 0.30, 0.55]) translate([30, 16.8, 12.25]) rotate([0, 0, 0]) guide_bush_b();
}

assembly();
